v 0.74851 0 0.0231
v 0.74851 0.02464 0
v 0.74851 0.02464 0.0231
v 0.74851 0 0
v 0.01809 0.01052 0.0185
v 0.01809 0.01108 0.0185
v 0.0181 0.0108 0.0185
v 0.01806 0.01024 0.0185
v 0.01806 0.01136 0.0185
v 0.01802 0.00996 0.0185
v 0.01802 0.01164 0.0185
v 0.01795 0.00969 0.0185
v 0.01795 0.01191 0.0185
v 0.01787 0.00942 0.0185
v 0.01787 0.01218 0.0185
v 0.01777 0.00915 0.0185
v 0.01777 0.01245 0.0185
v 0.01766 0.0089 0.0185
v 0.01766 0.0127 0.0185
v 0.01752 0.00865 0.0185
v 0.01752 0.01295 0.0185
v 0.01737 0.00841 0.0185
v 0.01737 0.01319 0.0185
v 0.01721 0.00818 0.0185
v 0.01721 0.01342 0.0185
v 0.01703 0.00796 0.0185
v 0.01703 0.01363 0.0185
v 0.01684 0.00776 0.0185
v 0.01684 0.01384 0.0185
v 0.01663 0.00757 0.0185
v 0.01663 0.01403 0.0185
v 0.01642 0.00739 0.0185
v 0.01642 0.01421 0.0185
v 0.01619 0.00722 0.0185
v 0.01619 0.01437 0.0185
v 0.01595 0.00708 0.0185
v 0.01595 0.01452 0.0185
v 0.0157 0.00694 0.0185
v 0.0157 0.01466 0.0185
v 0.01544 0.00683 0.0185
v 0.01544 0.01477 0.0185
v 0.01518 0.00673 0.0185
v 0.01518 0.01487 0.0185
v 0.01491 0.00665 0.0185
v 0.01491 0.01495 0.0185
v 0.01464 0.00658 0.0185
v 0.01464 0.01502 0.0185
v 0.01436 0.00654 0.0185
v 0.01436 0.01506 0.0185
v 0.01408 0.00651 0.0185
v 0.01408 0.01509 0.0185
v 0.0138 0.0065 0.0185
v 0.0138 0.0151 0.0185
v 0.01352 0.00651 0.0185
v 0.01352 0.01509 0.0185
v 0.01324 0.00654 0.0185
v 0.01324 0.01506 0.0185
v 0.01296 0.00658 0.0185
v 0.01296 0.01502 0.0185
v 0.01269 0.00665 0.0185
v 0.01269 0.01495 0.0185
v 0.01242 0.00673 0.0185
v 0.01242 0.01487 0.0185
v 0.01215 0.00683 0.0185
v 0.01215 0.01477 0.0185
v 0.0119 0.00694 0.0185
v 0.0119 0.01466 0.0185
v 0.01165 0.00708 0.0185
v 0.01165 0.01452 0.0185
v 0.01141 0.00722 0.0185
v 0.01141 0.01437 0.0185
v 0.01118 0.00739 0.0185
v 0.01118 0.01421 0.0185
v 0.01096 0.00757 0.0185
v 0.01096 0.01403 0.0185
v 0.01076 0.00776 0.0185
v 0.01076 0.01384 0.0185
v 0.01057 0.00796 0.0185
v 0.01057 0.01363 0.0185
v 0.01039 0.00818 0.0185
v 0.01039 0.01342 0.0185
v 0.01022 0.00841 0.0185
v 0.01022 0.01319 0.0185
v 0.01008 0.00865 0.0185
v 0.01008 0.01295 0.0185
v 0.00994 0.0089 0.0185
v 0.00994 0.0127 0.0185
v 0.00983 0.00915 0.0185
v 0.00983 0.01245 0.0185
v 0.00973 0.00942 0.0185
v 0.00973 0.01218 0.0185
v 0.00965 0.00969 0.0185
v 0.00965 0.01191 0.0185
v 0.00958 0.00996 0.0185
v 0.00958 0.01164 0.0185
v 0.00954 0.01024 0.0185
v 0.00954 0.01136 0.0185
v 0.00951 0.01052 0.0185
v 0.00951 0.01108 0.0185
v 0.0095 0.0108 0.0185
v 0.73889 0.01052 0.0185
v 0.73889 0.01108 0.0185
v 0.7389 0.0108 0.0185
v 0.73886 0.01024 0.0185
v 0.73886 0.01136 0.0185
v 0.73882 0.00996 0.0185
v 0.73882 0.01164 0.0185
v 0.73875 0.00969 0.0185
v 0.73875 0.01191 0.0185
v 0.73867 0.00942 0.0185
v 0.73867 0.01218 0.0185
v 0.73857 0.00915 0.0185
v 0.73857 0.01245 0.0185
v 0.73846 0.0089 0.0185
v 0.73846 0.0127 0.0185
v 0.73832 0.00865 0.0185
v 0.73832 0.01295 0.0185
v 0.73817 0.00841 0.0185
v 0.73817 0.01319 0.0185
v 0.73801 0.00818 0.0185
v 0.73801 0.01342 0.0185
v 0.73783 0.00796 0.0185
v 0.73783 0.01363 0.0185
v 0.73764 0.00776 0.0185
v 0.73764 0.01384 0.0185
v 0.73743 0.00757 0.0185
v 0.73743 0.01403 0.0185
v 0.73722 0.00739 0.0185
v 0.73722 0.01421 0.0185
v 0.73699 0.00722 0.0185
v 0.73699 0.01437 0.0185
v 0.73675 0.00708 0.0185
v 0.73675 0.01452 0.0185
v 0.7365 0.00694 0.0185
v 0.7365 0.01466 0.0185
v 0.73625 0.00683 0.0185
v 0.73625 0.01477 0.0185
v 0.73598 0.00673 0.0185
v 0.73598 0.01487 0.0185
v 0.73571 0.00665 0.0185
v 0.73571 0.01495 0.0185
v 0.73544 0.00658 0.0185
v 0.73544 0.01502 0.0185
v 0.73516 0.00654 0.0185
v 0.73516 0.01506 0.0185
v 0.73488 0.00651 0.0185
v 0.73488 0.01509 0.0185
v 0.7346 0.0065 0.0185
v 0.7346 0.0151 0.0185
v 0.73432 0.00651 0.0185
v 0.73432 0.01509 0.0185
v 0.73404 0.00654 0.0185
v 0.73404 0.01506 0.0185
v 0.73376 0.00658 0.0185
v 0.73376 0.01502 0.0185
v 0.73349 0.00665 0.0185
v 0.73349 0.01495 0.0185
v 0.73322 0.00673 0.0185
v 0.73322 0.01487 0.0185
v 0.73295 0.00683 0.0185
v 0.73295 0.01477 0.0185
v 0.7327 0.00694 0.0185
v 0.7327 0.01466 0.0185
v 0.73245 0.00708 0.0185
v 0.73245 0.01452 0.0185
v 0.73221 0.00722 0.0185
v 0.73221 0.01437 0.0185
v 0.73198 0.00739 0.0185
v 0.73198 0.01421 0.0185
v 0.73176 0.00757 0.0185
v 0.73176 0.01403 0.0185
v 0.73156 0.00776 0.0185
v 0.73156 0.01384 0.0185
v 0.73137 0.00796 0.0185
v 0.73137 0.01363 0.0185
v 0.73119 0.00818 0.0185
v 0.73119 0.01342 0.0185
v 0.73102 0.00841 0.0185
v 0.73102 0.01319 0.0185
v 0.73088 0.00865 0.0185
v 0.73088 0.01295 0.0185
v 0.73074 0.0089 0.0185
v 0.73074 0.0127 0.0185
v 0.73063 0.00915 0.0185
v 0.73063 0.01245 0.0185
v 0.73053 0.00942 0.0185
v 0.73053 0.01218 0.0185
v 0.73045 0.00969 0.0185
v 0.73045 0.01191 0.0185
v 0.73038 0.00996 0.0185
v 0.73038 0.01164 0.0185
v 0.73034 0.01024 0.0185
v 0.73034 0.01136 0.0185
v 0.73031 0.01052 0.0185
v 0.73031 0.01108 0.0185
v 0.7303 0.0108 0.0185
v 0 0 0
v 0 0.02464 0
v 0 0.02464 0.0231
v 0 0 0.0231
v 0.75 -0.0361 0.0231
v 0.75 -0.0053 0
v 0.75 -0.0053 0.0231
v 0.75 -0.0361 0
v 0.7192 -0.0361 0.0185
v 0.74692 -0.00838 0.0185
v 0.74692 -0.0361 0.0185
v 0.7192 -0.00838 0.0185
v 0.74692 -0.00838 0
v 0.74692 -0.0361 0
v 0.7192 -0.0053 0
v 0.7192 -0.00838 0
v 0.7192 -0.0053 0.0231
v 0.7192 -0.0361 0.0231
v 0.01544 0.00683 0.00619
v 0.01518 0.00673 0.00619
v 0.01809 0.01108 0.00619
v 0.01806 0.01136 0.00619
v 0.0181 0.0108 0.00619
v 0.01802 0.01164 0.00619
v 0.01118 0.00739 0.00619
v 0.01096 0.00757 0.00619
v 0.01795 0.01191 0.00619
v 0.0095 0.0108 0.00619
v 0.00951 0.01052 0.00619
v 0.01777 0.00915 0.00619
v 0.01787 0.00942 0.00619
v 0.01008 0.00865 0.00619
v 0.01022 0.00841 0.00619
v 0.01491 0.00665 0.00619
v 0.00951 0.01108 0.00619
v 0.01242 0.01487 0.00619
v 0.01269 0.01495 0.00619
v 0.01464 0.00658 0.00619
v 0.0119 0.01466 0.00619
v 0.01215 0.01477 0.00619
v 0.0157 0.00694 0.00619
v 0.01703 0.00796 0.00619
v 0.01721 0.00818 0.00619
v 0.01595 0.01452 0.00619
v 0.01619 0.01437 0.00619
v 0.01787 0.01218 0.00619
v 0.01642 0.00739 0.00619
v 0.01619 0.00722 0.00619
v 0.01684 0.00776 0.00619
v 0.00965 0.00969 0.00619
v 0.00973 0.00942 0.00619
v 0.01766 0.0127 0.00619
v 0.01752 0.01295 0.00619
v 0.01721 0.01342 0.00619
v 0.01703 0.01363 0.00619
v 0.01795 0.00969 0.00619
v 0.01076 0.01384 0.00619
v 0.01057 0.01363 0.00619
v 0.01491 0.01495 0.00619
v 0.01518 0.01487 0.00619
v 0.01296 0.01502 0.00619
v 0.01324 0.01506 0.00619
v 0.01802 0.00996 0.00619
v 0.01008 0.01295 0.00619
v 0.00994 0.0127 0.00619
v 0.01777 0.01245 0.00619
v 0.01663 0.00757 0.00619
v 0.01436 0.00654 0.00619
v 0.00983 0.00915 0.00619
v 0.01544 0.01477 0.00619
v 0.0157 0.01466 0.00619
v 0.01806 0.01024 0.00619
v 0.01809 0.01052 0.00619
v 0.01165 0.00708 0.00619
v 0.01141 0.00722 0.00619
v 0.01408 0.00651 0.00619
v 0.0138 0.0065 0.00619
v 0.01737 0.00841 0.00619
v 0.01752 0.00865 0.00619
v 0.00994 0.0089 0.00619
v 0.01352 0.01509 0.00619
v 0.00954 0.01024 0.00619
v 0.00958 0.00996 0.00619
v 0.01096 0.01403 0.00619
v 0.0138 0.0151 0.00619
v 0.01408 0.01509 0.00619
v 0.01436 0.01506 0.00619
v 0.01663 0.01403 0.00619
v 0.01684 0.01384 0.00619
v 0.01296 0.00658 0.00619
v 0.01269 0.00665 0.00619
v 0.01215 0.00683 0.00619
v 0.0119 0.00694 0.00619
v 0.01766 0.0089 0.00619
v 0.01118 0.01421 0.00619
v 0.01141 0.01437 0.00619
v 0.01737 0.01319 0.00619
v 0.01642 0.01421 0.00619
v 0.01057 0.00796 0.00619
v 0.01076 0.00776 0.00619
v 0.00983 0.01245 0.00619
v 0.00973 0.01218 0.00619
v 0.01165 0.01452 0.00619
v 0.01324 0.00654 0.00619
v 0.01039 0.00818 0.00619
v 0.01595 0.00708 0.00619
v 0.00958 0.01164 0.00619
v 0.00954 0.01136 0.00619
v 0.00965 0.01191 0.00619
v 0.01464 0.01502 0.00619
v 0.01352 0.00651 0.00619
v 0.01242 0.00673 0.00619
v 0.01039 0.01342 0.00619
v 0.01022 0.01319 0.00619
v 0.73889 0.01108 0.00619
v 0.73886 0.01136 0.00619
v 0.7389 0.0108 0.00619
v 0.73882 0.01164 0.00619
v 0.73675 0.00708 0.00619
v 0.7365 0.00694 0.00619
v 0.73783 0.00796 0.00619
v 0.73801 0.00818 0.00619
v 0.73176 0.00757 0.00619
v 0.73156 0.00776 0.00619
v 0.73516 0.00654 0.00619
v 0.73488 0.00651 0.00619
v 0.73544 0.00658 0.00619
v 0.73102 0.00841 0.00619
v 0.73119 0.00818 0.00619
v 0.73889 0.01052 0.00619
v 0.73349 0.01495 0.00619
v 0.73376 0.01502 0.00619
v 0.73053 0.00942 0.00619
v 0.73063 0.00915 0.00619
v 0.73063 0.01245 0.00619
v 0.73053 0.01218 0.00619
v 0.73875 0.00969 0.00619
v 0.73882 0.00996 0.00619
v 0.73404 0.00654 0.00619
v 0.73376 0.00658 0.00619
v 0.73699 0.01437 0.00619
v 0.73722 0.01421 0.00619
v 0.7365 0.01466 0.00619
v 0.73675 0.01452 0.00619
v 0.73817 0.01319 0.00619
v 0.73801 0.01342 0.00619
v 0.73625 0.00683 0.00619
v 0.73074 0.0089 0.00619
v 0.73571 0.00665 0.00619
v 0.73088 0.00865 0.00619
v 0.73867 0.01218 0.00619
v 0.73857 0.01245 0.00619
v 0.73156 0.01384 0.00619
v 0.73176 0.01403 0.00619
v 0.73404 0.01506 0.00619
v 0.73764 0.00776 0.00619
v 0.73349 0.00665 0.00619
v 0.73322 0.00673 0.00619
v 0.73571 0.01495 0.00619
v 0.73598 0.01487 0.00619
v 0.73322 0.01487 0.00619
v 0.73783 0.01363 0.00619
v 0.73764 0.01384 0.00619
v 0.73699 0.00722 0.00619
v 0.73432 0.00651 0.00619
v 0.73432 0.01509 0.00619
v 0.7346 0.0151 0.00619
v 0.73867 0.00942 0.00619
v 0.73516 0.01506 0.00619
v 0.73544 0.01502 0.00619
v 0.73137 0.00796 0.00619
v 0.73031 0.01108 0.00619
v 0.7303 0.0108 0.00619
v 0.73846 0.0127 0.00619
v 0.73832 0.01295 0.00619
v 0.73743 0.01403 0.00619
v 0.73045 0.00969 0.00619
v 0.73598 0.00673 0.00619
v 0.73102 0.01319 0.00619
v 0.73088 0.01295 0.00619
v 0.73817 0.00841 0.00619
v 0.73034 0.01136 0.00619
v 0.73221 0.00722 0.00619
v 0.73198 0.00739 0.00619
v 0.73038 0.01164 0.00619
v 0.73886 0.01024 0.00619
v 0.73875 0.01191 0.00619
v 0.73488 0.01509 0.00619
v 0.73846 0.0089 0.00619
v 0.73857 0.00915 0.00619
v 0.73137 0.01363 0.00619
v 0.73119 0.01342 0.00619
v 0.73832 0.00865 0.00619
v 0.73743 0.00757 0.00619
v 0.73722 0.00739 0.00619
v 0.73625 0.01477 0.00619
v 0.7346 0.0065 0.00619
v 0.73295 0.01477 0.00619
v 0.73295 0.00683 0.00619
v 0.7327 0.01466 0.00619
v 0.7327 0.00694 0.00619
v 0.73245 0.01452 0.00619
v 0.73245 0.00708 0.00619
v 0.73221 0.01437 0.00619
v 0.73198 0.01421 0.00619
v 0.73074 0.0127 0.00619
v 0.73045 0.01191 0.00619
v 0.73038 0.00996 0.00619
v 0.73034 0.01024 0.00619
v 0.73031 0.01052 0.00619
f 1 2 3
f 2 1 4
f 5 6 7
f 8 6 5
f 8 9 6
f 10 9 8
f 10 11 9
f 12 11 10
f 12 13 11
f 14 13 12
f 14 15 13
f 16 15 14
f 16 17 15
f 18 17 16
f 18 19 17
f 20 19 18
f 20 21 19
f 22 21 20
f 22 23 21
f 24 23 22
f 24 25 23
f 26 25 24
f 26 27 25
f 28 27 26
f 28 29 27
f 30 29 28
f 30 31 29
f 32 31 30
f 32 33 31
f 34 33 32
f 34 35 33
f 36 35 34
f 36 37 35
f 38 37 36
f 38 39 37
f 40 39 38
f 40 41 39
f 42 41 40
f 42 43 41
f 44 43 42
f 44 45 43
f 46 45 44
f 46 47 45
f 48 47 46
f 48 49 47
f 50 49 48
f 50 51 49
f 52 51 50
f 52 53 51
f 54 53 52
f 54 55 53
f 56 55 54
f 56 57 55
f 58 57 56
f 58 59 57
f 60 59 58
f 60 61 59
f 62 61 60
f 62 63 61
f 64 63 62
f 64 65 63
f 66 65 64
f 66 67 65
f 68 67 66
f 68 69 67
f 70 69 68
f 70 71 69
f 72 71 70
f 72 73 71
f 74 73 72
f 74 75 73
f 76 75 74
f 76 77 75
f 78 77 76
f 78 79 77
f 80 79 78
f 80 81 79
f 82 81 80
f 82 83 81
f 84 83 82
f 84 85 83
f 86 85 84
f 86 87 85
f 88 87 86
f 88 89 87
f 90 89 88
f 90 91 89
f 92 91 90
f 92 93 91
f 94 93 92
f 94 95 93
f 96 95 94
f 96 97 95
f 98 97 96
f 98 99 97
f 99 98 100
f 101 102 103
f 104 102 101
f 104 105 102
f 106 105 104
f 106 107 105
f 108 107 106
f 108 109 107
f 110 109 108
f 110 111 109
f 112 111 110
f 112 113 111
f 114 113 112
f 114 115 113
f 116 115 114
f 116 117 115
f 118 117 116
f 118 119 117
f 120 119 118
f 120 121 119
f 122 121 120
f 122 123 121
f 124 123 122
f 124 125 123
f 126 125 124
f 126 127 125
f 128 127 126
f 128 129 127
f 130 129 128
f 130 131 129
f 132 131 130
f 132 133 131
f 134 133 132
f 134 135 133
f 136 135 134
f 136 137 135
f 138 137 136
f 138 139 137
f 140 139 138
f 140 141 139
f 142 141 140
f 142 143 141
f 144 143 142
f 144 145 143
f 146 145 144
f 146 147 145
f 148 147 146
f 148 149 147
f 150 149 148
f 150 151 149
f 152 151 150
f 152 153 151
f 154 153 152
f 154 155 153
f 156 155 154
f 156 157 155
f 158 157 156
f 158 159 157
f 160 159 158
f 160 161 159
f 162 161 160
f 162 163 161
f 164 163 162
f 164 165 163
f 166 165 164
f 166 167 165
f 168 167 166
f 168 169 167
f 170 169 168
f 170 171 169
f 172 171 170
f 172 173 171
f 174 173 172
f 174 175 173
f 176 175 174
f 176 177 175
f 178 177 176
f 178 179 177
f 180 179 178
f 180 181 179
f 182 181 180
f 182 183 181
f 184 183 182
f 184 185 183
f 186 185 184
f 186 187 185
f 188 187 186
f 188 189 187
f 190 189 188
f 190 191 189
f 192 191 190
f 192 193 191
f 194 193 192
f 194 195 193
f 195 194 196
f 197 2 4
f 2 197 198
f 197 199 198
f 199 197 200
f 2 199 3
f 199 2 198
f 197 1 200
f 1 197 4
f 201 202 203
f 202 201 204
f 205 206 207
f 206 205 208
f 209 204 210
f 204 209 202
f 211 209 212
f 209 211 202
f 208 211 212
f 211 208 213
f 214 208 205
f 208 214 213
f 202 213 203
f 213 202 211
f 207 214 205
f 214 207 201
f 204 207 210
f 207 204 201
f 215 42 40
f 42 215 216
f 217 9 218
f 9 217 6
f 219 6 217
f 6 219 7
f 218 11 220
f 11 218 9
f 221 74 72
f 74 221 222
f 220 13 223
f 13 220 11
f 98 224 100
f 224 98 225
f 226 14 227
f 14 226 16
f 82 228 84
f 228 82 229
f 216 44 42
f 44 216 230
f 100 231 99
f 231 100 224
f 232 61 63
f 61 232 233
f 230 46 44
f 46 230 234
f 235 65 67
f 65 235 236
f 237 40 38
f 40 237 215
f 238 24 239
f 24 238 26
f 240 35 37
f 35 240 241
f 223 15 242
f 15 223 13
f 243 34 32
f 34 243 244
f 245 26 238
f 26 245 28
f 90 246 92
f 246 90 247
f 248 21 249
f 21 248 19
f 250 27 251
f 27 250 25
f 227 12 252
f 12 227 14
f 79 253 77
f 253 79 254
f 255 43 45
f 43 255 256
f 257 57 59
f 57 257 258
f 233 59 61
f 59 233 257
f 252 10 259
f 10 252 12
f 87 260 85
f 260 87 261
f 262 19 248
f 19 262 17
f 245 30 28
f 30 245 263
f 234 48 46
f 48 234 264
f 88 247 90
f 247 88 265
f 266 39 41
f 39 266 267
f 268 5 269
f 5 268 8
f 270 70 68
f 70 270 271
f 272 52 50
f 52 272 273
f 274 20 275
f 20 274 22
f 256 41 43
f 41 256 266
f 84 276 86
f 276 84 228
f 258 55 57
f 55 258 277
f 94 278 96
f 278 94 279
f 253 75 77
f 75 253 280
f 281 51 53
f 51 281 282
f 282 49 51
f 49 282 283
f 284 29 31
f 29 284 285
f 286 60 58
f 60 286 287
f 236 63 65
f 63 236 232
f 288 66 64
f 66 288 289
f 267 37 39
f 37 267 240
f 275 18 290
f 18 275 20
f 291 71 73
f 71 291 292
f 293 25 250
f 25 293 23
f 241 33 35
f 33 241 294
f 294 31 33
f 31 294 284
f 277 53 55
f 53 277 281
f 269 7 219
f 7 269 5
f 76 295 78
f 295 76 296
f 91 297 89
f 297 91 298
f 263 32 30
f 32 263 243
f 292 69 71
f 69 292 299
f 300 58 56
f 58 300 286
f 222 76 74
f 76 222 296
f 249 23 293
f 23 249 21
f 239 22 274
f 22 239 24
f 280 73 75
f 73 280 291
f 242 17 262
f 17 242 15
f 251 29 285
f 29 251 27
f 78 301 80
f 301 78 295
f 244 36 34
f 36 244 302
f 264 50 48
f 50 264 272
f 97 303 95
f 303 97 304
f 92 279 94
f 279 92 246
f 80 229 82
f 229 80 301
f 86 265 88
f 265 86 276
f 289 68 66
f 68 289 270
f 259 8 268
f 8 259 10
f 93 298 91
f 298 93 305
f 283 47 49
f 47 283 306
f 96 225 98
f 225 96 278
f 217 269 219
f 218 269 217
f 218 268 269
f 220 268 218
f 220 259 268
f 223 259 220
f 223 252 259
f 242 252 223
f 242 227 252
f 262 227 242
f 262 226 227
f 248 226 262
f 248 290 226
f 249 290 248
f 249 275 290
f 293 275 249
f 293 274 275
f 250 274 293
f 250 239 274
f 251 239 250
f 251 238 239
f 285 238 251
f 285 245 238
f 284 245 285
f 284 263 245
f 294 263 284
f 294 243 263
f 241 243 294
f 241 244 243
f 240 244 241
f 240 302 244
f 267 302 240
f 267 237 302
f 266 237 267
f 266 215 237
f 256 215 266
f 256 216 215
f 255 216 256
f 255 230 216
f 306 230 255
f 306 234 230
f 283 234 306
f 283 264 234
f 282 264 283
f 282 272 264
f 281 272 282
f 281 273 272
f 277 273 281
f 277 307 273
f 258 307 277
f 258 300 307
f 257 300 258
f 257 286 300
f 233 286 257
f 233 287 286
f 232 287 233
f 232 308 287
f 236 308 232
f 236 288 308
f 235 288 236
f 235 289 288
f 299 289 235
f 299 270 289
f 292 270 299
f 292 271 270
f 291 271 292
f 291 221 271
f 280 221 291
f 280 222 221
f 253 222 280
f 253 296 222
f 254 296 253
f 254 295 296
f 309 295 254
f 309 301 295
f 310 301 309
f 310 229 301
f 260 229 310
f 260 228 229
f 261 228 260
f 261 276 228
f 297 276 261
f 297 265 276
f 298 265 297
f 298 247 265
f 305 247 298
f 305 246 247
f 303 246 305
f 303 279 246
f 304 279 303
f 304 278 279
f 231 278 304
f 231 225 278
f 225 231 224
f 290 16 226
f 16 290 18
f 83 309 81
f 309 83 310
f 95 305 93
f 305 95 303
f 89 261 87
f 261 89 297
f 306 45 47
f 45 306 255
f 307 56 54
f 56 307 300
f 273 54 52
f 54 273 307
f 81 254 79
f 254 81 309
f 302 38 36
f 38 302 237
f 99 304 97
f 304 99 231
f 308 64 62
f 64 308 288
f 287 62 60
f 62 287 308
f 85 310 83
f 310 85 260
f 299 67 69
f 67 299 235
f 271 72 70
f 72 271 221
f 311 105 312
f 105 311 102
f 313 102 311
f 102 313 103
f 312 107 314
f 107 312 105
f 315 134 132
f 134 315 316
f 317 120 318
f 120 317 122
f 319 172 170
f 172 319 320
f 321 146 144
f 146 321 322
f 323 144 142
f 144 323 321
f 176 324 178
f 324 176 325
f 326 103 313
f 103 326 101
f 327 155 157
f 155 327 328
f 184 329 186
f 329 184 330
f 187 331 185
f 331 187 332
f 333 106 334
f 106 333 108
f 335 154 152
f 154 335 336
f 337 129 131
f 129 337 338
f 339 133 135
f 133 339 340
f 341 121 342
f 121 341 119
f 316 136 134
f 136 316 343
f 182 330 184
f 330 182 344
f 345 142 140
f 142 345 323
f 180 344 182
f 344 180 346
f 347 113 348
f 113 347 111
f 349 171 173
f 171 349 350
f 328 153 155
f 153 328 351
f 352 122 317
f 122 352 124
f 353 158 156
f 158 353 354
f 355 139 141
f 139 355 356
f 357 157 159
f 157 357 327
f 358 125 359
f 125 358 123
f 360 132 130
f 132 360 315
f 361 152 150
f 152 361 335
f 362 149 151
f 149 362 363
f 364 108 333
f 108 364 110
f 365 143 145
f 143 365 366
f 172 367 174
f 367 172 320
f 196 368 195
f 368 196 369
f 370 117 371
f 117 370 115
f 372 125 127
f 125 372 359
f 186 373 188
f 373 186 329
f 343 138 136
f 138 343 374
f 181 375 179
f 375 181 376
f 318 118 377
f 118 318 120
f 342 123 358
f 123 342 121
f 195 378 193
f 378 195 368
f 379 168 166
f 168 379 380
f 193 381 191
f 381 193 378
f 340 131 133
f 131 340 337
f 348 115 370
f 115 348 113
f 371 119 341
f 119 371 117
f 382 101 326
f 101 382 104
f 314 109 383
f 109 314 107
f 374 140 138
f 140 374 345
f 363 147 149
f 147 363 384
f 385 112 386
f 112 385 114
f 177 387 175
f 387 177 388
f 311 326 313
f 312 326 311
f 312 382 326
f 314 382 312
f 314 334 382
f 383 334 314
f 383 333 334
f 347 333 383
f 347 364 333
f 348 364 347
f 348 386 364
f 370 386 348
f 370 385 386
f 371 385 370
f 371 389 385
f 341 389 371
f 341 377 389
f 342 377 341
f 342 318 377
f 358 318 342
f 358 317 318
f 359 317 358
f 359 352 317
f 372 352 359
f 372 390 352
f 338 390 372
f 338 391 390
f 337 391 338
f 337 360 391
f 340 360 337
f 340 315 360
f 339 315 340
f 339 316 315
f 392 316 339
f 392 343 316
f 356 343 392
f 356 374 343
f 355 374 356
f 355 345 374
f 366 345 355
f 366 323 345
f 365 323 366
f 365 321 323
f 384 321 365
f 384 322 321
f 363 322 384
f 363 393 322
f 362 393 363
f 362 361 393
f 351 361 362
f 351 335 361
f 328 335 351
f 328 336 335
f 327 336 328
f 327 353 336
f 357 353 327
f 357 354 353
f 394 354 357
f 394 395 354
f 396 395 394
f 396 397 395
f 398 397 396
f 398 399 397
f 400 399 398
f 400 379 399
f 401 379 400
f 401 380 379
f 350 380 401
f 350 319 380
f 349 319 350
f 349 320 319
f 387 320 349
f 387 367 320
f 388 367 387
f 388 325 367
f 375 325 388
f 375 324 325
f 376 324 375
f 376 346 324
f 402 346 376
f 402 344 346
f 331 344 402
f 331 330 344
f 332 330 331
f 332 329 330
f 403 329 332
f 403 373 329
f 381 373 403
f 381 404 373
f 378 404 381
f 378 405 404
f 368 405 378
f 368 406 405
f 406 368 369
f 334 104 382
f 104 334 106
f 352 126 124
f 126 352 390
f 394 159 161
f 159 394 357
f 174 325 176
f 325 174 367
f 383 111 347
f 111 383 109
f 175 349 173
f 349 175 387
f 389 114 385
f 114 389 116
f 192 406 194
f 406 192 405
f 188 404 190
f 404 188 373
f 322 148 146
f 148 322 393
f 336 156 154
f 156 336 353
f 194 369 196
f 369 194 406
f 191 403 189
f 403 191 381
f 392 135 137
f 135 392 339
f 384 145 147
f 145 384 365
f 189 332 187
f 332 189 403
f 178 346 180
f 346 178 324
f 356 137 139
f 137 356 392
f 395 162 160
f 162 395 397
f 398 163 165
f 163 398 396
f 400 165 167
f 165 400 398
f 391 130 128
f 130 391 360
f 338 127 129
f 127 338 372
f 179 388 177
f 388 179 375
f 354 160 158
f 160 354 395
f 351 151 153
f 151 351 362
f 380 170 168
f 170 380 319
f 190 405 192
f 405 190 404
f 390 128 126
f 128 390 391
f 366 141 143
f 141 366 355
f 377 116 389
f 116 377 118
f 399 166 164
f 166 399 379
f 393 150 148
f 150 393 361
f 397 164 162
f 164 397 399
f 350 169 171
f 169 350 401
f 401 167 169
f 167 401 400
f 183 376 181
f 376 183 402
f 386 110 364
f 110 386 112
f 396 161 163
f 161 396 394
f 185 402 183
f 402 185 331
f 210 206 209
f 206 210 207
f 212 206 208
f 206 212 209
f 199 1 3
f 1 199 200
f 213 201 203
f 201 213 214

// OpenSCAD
// Parameters
$fn = 96;
eps = 0.00001;

// Reference datum
rail_left_x = 0;
rail_front_y = 0;
base_z = 0;

// Main rail
rail_length = 0.748506;
rail_width = 0.024642;
rail_height_nominal = 0.018482;
lower_body_height = 0.0185;

// Shallow top layers
top_layer_thickness_nominal = 0.00462;
top_layer_height = 0.0046;
top_layer_z = lower_body_height;

// Circular recess bands
recess_radius = 0.0043;
recess_bottom_z = 0.0062;
recess_depth = 0.0123;
recess_top_z = recess_bottom_z + recess_depth;

// Rail recess locations
rail_recess_y_offset = 0.0108;
rail_recess_y = rail_front_y + rail_recess_y_offset;
rail_recess_xs = [0.0138, 0.7346];

// End block
end_block_side = 0.030803;
end_block_left_x = 0.7192;
end_block_right_overhang_ref = 0.0015;
end_block_front_offset = 0.0361;
end_block_back_offset_ref = 0.0299;
end_block_x = rail_left_x + end_block_left_x;
end_block_y = rail_front_y - end_block_front_offset;

// End block circular recess
end_recess_x = rail_left_x + 0.7361;
end_recess_y = rail_front_y - 0.0192;

// Deep end cutout
end_cutout_side = 0.027722;
end_cutout_reach = 0.077;
end_cutout_top_z = lower_body_height;
end_cutout_bottom_z = end_cutout_top_z - end_cutout_reach;

// Helper: box from minimum corner
module box_min(x, y, z, sx, sy, sz) {
    translate([x, y, z])
        cube([sx, sy, sz], center=false);
}

// Lower rail body
module rail_lower_body() {
    box_min(rail_left_x, rail_front_y, base_z,
            rail_length, rail_width, lower_body_height);
}

// Rail top layer
module rail_top_layer() {
    box_min(rail_left_x, rail_front_y, top_layer_z,
            rail_length, rail_width, top_layer_height);
}

// Lower end block body
module end_block_lower_body() {
    box_min(end_block_x, end_block_y, base_z,
            end_block_side, end_block_side, lower_body_height);
}

// End block top layer
module end_block_top_layer() {
    box_min(end_block_x, end_block_y, top_layer_z,
            end_block_side, end_block_side, top_layer_height);
}

// Vertical blind circular recess cutter
module circular_recess_cut(x, y) {
    translate([x, y, recess_bottom_z - eps])
        cylinder(h=recess_depth + 2*eps, r=recess_radius, center=false);
}

// Deep square cutout sharing end block left/front edges
module end_cutout_cut() {
    box_min(end_block_x - eps, end_block_y - eps, end_cutout_bottom_z,
            end_cutout_side + eps, end_cutout_side + eps,
            end_cutout_reach + eps);
}

// Lower solid bodies before cuts
module lower_bodies() {
    union() {
        rail_lower_body();
        end_block_lower_body();
    }
}

// All shallow top layers
module top_layers() {
    union() {
        rail_top_layer();
        end_block_top_layer();
    }
}

// All removed lower-body features
module lower_body_cuts() {
    for (x = rail_recess_xs)
        circular_recess_cut(x, rail_recess_y);

    circular_recess_cut(end_recess_x, end_recess_y);
    end_cutout_cut();
}

// Main model
union() {
    difference() {
        lower_bodies();
        lower_body_cuts();
    }

    top_layers();
}
